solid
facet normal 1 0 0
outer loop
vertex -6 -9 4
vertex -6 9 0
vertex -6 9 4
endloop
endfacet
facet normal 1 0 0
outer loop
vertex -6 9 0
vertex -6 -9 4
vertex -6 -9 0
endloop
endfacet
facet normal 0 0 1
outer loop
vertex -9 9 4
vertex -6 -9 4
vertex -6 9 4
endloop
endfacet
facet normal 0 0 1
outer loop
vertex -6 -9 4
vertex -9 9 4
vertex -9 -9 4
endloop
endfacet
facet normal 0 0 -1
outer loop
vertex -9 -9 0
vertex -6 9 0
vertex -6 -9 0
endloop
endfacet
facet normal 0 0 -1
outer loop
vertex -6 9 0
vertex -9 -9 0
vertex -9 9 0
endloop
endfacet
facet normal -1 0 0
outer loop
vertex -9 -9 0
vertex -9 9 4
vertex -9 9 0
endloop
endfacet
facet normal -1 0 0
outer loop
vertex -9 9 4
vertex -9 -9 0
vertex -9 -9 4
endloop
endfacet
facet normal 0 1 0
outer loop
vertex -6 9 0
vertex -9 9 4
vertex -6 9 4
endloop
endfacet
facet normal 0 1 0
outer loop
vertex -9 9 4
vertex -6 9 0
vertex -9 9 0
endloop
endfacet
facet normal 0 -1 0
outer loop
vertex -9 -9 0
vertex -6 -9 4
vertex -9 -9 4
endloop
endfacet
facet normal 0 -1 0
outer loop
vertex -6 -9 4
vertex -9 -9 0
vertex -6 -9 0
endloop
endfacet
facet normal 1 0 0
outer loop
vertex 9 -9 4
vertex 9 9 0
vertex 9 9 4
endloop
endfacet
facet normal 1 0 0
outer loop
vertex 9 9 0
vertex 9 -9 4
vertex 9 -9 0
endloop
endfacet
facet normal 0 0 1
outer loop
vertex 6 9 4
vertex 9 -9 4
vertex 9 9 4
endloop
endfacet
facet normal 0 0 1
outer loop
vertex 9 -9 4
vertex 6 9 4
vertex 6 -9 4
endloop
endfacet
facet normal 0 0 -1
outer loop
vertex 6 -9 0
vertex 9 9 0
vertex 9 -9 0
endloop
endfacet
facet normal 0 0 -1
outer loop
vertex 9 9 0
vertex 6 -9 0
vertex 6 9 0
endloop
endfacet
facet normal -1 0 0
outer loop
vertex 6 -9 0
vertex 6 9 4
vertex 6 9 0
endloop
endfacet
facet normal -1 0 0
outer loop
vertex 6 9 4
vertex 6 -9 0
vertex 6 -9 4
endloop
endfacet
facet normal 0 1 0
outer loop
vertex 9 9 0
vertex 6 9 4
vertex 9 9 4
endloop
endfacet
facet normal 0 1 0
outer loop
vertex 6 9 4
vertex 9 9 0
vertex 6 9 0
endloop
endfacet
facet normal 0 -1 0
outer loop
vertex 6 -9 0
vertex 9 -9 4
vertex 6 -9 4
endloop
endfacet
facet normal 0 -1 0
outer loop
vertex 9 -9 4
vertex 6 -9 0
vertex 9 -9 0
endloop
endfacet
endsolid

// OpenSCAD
// Bulldozer Tracks
body_width = 12;
tread_width = 3;
tread_height = 4;
tread_length = 18;

union() {
    // Left Tread
    translate([-(body_width/2 + tread_width), -tread_length/2, 0])
        cube([tread_width, tread_length, tread_height]);

    // Right Tread
    translate([body_width/2, -tread_length/2, 0])
        cube([tread_width, tread_length, tread_height]);
}
